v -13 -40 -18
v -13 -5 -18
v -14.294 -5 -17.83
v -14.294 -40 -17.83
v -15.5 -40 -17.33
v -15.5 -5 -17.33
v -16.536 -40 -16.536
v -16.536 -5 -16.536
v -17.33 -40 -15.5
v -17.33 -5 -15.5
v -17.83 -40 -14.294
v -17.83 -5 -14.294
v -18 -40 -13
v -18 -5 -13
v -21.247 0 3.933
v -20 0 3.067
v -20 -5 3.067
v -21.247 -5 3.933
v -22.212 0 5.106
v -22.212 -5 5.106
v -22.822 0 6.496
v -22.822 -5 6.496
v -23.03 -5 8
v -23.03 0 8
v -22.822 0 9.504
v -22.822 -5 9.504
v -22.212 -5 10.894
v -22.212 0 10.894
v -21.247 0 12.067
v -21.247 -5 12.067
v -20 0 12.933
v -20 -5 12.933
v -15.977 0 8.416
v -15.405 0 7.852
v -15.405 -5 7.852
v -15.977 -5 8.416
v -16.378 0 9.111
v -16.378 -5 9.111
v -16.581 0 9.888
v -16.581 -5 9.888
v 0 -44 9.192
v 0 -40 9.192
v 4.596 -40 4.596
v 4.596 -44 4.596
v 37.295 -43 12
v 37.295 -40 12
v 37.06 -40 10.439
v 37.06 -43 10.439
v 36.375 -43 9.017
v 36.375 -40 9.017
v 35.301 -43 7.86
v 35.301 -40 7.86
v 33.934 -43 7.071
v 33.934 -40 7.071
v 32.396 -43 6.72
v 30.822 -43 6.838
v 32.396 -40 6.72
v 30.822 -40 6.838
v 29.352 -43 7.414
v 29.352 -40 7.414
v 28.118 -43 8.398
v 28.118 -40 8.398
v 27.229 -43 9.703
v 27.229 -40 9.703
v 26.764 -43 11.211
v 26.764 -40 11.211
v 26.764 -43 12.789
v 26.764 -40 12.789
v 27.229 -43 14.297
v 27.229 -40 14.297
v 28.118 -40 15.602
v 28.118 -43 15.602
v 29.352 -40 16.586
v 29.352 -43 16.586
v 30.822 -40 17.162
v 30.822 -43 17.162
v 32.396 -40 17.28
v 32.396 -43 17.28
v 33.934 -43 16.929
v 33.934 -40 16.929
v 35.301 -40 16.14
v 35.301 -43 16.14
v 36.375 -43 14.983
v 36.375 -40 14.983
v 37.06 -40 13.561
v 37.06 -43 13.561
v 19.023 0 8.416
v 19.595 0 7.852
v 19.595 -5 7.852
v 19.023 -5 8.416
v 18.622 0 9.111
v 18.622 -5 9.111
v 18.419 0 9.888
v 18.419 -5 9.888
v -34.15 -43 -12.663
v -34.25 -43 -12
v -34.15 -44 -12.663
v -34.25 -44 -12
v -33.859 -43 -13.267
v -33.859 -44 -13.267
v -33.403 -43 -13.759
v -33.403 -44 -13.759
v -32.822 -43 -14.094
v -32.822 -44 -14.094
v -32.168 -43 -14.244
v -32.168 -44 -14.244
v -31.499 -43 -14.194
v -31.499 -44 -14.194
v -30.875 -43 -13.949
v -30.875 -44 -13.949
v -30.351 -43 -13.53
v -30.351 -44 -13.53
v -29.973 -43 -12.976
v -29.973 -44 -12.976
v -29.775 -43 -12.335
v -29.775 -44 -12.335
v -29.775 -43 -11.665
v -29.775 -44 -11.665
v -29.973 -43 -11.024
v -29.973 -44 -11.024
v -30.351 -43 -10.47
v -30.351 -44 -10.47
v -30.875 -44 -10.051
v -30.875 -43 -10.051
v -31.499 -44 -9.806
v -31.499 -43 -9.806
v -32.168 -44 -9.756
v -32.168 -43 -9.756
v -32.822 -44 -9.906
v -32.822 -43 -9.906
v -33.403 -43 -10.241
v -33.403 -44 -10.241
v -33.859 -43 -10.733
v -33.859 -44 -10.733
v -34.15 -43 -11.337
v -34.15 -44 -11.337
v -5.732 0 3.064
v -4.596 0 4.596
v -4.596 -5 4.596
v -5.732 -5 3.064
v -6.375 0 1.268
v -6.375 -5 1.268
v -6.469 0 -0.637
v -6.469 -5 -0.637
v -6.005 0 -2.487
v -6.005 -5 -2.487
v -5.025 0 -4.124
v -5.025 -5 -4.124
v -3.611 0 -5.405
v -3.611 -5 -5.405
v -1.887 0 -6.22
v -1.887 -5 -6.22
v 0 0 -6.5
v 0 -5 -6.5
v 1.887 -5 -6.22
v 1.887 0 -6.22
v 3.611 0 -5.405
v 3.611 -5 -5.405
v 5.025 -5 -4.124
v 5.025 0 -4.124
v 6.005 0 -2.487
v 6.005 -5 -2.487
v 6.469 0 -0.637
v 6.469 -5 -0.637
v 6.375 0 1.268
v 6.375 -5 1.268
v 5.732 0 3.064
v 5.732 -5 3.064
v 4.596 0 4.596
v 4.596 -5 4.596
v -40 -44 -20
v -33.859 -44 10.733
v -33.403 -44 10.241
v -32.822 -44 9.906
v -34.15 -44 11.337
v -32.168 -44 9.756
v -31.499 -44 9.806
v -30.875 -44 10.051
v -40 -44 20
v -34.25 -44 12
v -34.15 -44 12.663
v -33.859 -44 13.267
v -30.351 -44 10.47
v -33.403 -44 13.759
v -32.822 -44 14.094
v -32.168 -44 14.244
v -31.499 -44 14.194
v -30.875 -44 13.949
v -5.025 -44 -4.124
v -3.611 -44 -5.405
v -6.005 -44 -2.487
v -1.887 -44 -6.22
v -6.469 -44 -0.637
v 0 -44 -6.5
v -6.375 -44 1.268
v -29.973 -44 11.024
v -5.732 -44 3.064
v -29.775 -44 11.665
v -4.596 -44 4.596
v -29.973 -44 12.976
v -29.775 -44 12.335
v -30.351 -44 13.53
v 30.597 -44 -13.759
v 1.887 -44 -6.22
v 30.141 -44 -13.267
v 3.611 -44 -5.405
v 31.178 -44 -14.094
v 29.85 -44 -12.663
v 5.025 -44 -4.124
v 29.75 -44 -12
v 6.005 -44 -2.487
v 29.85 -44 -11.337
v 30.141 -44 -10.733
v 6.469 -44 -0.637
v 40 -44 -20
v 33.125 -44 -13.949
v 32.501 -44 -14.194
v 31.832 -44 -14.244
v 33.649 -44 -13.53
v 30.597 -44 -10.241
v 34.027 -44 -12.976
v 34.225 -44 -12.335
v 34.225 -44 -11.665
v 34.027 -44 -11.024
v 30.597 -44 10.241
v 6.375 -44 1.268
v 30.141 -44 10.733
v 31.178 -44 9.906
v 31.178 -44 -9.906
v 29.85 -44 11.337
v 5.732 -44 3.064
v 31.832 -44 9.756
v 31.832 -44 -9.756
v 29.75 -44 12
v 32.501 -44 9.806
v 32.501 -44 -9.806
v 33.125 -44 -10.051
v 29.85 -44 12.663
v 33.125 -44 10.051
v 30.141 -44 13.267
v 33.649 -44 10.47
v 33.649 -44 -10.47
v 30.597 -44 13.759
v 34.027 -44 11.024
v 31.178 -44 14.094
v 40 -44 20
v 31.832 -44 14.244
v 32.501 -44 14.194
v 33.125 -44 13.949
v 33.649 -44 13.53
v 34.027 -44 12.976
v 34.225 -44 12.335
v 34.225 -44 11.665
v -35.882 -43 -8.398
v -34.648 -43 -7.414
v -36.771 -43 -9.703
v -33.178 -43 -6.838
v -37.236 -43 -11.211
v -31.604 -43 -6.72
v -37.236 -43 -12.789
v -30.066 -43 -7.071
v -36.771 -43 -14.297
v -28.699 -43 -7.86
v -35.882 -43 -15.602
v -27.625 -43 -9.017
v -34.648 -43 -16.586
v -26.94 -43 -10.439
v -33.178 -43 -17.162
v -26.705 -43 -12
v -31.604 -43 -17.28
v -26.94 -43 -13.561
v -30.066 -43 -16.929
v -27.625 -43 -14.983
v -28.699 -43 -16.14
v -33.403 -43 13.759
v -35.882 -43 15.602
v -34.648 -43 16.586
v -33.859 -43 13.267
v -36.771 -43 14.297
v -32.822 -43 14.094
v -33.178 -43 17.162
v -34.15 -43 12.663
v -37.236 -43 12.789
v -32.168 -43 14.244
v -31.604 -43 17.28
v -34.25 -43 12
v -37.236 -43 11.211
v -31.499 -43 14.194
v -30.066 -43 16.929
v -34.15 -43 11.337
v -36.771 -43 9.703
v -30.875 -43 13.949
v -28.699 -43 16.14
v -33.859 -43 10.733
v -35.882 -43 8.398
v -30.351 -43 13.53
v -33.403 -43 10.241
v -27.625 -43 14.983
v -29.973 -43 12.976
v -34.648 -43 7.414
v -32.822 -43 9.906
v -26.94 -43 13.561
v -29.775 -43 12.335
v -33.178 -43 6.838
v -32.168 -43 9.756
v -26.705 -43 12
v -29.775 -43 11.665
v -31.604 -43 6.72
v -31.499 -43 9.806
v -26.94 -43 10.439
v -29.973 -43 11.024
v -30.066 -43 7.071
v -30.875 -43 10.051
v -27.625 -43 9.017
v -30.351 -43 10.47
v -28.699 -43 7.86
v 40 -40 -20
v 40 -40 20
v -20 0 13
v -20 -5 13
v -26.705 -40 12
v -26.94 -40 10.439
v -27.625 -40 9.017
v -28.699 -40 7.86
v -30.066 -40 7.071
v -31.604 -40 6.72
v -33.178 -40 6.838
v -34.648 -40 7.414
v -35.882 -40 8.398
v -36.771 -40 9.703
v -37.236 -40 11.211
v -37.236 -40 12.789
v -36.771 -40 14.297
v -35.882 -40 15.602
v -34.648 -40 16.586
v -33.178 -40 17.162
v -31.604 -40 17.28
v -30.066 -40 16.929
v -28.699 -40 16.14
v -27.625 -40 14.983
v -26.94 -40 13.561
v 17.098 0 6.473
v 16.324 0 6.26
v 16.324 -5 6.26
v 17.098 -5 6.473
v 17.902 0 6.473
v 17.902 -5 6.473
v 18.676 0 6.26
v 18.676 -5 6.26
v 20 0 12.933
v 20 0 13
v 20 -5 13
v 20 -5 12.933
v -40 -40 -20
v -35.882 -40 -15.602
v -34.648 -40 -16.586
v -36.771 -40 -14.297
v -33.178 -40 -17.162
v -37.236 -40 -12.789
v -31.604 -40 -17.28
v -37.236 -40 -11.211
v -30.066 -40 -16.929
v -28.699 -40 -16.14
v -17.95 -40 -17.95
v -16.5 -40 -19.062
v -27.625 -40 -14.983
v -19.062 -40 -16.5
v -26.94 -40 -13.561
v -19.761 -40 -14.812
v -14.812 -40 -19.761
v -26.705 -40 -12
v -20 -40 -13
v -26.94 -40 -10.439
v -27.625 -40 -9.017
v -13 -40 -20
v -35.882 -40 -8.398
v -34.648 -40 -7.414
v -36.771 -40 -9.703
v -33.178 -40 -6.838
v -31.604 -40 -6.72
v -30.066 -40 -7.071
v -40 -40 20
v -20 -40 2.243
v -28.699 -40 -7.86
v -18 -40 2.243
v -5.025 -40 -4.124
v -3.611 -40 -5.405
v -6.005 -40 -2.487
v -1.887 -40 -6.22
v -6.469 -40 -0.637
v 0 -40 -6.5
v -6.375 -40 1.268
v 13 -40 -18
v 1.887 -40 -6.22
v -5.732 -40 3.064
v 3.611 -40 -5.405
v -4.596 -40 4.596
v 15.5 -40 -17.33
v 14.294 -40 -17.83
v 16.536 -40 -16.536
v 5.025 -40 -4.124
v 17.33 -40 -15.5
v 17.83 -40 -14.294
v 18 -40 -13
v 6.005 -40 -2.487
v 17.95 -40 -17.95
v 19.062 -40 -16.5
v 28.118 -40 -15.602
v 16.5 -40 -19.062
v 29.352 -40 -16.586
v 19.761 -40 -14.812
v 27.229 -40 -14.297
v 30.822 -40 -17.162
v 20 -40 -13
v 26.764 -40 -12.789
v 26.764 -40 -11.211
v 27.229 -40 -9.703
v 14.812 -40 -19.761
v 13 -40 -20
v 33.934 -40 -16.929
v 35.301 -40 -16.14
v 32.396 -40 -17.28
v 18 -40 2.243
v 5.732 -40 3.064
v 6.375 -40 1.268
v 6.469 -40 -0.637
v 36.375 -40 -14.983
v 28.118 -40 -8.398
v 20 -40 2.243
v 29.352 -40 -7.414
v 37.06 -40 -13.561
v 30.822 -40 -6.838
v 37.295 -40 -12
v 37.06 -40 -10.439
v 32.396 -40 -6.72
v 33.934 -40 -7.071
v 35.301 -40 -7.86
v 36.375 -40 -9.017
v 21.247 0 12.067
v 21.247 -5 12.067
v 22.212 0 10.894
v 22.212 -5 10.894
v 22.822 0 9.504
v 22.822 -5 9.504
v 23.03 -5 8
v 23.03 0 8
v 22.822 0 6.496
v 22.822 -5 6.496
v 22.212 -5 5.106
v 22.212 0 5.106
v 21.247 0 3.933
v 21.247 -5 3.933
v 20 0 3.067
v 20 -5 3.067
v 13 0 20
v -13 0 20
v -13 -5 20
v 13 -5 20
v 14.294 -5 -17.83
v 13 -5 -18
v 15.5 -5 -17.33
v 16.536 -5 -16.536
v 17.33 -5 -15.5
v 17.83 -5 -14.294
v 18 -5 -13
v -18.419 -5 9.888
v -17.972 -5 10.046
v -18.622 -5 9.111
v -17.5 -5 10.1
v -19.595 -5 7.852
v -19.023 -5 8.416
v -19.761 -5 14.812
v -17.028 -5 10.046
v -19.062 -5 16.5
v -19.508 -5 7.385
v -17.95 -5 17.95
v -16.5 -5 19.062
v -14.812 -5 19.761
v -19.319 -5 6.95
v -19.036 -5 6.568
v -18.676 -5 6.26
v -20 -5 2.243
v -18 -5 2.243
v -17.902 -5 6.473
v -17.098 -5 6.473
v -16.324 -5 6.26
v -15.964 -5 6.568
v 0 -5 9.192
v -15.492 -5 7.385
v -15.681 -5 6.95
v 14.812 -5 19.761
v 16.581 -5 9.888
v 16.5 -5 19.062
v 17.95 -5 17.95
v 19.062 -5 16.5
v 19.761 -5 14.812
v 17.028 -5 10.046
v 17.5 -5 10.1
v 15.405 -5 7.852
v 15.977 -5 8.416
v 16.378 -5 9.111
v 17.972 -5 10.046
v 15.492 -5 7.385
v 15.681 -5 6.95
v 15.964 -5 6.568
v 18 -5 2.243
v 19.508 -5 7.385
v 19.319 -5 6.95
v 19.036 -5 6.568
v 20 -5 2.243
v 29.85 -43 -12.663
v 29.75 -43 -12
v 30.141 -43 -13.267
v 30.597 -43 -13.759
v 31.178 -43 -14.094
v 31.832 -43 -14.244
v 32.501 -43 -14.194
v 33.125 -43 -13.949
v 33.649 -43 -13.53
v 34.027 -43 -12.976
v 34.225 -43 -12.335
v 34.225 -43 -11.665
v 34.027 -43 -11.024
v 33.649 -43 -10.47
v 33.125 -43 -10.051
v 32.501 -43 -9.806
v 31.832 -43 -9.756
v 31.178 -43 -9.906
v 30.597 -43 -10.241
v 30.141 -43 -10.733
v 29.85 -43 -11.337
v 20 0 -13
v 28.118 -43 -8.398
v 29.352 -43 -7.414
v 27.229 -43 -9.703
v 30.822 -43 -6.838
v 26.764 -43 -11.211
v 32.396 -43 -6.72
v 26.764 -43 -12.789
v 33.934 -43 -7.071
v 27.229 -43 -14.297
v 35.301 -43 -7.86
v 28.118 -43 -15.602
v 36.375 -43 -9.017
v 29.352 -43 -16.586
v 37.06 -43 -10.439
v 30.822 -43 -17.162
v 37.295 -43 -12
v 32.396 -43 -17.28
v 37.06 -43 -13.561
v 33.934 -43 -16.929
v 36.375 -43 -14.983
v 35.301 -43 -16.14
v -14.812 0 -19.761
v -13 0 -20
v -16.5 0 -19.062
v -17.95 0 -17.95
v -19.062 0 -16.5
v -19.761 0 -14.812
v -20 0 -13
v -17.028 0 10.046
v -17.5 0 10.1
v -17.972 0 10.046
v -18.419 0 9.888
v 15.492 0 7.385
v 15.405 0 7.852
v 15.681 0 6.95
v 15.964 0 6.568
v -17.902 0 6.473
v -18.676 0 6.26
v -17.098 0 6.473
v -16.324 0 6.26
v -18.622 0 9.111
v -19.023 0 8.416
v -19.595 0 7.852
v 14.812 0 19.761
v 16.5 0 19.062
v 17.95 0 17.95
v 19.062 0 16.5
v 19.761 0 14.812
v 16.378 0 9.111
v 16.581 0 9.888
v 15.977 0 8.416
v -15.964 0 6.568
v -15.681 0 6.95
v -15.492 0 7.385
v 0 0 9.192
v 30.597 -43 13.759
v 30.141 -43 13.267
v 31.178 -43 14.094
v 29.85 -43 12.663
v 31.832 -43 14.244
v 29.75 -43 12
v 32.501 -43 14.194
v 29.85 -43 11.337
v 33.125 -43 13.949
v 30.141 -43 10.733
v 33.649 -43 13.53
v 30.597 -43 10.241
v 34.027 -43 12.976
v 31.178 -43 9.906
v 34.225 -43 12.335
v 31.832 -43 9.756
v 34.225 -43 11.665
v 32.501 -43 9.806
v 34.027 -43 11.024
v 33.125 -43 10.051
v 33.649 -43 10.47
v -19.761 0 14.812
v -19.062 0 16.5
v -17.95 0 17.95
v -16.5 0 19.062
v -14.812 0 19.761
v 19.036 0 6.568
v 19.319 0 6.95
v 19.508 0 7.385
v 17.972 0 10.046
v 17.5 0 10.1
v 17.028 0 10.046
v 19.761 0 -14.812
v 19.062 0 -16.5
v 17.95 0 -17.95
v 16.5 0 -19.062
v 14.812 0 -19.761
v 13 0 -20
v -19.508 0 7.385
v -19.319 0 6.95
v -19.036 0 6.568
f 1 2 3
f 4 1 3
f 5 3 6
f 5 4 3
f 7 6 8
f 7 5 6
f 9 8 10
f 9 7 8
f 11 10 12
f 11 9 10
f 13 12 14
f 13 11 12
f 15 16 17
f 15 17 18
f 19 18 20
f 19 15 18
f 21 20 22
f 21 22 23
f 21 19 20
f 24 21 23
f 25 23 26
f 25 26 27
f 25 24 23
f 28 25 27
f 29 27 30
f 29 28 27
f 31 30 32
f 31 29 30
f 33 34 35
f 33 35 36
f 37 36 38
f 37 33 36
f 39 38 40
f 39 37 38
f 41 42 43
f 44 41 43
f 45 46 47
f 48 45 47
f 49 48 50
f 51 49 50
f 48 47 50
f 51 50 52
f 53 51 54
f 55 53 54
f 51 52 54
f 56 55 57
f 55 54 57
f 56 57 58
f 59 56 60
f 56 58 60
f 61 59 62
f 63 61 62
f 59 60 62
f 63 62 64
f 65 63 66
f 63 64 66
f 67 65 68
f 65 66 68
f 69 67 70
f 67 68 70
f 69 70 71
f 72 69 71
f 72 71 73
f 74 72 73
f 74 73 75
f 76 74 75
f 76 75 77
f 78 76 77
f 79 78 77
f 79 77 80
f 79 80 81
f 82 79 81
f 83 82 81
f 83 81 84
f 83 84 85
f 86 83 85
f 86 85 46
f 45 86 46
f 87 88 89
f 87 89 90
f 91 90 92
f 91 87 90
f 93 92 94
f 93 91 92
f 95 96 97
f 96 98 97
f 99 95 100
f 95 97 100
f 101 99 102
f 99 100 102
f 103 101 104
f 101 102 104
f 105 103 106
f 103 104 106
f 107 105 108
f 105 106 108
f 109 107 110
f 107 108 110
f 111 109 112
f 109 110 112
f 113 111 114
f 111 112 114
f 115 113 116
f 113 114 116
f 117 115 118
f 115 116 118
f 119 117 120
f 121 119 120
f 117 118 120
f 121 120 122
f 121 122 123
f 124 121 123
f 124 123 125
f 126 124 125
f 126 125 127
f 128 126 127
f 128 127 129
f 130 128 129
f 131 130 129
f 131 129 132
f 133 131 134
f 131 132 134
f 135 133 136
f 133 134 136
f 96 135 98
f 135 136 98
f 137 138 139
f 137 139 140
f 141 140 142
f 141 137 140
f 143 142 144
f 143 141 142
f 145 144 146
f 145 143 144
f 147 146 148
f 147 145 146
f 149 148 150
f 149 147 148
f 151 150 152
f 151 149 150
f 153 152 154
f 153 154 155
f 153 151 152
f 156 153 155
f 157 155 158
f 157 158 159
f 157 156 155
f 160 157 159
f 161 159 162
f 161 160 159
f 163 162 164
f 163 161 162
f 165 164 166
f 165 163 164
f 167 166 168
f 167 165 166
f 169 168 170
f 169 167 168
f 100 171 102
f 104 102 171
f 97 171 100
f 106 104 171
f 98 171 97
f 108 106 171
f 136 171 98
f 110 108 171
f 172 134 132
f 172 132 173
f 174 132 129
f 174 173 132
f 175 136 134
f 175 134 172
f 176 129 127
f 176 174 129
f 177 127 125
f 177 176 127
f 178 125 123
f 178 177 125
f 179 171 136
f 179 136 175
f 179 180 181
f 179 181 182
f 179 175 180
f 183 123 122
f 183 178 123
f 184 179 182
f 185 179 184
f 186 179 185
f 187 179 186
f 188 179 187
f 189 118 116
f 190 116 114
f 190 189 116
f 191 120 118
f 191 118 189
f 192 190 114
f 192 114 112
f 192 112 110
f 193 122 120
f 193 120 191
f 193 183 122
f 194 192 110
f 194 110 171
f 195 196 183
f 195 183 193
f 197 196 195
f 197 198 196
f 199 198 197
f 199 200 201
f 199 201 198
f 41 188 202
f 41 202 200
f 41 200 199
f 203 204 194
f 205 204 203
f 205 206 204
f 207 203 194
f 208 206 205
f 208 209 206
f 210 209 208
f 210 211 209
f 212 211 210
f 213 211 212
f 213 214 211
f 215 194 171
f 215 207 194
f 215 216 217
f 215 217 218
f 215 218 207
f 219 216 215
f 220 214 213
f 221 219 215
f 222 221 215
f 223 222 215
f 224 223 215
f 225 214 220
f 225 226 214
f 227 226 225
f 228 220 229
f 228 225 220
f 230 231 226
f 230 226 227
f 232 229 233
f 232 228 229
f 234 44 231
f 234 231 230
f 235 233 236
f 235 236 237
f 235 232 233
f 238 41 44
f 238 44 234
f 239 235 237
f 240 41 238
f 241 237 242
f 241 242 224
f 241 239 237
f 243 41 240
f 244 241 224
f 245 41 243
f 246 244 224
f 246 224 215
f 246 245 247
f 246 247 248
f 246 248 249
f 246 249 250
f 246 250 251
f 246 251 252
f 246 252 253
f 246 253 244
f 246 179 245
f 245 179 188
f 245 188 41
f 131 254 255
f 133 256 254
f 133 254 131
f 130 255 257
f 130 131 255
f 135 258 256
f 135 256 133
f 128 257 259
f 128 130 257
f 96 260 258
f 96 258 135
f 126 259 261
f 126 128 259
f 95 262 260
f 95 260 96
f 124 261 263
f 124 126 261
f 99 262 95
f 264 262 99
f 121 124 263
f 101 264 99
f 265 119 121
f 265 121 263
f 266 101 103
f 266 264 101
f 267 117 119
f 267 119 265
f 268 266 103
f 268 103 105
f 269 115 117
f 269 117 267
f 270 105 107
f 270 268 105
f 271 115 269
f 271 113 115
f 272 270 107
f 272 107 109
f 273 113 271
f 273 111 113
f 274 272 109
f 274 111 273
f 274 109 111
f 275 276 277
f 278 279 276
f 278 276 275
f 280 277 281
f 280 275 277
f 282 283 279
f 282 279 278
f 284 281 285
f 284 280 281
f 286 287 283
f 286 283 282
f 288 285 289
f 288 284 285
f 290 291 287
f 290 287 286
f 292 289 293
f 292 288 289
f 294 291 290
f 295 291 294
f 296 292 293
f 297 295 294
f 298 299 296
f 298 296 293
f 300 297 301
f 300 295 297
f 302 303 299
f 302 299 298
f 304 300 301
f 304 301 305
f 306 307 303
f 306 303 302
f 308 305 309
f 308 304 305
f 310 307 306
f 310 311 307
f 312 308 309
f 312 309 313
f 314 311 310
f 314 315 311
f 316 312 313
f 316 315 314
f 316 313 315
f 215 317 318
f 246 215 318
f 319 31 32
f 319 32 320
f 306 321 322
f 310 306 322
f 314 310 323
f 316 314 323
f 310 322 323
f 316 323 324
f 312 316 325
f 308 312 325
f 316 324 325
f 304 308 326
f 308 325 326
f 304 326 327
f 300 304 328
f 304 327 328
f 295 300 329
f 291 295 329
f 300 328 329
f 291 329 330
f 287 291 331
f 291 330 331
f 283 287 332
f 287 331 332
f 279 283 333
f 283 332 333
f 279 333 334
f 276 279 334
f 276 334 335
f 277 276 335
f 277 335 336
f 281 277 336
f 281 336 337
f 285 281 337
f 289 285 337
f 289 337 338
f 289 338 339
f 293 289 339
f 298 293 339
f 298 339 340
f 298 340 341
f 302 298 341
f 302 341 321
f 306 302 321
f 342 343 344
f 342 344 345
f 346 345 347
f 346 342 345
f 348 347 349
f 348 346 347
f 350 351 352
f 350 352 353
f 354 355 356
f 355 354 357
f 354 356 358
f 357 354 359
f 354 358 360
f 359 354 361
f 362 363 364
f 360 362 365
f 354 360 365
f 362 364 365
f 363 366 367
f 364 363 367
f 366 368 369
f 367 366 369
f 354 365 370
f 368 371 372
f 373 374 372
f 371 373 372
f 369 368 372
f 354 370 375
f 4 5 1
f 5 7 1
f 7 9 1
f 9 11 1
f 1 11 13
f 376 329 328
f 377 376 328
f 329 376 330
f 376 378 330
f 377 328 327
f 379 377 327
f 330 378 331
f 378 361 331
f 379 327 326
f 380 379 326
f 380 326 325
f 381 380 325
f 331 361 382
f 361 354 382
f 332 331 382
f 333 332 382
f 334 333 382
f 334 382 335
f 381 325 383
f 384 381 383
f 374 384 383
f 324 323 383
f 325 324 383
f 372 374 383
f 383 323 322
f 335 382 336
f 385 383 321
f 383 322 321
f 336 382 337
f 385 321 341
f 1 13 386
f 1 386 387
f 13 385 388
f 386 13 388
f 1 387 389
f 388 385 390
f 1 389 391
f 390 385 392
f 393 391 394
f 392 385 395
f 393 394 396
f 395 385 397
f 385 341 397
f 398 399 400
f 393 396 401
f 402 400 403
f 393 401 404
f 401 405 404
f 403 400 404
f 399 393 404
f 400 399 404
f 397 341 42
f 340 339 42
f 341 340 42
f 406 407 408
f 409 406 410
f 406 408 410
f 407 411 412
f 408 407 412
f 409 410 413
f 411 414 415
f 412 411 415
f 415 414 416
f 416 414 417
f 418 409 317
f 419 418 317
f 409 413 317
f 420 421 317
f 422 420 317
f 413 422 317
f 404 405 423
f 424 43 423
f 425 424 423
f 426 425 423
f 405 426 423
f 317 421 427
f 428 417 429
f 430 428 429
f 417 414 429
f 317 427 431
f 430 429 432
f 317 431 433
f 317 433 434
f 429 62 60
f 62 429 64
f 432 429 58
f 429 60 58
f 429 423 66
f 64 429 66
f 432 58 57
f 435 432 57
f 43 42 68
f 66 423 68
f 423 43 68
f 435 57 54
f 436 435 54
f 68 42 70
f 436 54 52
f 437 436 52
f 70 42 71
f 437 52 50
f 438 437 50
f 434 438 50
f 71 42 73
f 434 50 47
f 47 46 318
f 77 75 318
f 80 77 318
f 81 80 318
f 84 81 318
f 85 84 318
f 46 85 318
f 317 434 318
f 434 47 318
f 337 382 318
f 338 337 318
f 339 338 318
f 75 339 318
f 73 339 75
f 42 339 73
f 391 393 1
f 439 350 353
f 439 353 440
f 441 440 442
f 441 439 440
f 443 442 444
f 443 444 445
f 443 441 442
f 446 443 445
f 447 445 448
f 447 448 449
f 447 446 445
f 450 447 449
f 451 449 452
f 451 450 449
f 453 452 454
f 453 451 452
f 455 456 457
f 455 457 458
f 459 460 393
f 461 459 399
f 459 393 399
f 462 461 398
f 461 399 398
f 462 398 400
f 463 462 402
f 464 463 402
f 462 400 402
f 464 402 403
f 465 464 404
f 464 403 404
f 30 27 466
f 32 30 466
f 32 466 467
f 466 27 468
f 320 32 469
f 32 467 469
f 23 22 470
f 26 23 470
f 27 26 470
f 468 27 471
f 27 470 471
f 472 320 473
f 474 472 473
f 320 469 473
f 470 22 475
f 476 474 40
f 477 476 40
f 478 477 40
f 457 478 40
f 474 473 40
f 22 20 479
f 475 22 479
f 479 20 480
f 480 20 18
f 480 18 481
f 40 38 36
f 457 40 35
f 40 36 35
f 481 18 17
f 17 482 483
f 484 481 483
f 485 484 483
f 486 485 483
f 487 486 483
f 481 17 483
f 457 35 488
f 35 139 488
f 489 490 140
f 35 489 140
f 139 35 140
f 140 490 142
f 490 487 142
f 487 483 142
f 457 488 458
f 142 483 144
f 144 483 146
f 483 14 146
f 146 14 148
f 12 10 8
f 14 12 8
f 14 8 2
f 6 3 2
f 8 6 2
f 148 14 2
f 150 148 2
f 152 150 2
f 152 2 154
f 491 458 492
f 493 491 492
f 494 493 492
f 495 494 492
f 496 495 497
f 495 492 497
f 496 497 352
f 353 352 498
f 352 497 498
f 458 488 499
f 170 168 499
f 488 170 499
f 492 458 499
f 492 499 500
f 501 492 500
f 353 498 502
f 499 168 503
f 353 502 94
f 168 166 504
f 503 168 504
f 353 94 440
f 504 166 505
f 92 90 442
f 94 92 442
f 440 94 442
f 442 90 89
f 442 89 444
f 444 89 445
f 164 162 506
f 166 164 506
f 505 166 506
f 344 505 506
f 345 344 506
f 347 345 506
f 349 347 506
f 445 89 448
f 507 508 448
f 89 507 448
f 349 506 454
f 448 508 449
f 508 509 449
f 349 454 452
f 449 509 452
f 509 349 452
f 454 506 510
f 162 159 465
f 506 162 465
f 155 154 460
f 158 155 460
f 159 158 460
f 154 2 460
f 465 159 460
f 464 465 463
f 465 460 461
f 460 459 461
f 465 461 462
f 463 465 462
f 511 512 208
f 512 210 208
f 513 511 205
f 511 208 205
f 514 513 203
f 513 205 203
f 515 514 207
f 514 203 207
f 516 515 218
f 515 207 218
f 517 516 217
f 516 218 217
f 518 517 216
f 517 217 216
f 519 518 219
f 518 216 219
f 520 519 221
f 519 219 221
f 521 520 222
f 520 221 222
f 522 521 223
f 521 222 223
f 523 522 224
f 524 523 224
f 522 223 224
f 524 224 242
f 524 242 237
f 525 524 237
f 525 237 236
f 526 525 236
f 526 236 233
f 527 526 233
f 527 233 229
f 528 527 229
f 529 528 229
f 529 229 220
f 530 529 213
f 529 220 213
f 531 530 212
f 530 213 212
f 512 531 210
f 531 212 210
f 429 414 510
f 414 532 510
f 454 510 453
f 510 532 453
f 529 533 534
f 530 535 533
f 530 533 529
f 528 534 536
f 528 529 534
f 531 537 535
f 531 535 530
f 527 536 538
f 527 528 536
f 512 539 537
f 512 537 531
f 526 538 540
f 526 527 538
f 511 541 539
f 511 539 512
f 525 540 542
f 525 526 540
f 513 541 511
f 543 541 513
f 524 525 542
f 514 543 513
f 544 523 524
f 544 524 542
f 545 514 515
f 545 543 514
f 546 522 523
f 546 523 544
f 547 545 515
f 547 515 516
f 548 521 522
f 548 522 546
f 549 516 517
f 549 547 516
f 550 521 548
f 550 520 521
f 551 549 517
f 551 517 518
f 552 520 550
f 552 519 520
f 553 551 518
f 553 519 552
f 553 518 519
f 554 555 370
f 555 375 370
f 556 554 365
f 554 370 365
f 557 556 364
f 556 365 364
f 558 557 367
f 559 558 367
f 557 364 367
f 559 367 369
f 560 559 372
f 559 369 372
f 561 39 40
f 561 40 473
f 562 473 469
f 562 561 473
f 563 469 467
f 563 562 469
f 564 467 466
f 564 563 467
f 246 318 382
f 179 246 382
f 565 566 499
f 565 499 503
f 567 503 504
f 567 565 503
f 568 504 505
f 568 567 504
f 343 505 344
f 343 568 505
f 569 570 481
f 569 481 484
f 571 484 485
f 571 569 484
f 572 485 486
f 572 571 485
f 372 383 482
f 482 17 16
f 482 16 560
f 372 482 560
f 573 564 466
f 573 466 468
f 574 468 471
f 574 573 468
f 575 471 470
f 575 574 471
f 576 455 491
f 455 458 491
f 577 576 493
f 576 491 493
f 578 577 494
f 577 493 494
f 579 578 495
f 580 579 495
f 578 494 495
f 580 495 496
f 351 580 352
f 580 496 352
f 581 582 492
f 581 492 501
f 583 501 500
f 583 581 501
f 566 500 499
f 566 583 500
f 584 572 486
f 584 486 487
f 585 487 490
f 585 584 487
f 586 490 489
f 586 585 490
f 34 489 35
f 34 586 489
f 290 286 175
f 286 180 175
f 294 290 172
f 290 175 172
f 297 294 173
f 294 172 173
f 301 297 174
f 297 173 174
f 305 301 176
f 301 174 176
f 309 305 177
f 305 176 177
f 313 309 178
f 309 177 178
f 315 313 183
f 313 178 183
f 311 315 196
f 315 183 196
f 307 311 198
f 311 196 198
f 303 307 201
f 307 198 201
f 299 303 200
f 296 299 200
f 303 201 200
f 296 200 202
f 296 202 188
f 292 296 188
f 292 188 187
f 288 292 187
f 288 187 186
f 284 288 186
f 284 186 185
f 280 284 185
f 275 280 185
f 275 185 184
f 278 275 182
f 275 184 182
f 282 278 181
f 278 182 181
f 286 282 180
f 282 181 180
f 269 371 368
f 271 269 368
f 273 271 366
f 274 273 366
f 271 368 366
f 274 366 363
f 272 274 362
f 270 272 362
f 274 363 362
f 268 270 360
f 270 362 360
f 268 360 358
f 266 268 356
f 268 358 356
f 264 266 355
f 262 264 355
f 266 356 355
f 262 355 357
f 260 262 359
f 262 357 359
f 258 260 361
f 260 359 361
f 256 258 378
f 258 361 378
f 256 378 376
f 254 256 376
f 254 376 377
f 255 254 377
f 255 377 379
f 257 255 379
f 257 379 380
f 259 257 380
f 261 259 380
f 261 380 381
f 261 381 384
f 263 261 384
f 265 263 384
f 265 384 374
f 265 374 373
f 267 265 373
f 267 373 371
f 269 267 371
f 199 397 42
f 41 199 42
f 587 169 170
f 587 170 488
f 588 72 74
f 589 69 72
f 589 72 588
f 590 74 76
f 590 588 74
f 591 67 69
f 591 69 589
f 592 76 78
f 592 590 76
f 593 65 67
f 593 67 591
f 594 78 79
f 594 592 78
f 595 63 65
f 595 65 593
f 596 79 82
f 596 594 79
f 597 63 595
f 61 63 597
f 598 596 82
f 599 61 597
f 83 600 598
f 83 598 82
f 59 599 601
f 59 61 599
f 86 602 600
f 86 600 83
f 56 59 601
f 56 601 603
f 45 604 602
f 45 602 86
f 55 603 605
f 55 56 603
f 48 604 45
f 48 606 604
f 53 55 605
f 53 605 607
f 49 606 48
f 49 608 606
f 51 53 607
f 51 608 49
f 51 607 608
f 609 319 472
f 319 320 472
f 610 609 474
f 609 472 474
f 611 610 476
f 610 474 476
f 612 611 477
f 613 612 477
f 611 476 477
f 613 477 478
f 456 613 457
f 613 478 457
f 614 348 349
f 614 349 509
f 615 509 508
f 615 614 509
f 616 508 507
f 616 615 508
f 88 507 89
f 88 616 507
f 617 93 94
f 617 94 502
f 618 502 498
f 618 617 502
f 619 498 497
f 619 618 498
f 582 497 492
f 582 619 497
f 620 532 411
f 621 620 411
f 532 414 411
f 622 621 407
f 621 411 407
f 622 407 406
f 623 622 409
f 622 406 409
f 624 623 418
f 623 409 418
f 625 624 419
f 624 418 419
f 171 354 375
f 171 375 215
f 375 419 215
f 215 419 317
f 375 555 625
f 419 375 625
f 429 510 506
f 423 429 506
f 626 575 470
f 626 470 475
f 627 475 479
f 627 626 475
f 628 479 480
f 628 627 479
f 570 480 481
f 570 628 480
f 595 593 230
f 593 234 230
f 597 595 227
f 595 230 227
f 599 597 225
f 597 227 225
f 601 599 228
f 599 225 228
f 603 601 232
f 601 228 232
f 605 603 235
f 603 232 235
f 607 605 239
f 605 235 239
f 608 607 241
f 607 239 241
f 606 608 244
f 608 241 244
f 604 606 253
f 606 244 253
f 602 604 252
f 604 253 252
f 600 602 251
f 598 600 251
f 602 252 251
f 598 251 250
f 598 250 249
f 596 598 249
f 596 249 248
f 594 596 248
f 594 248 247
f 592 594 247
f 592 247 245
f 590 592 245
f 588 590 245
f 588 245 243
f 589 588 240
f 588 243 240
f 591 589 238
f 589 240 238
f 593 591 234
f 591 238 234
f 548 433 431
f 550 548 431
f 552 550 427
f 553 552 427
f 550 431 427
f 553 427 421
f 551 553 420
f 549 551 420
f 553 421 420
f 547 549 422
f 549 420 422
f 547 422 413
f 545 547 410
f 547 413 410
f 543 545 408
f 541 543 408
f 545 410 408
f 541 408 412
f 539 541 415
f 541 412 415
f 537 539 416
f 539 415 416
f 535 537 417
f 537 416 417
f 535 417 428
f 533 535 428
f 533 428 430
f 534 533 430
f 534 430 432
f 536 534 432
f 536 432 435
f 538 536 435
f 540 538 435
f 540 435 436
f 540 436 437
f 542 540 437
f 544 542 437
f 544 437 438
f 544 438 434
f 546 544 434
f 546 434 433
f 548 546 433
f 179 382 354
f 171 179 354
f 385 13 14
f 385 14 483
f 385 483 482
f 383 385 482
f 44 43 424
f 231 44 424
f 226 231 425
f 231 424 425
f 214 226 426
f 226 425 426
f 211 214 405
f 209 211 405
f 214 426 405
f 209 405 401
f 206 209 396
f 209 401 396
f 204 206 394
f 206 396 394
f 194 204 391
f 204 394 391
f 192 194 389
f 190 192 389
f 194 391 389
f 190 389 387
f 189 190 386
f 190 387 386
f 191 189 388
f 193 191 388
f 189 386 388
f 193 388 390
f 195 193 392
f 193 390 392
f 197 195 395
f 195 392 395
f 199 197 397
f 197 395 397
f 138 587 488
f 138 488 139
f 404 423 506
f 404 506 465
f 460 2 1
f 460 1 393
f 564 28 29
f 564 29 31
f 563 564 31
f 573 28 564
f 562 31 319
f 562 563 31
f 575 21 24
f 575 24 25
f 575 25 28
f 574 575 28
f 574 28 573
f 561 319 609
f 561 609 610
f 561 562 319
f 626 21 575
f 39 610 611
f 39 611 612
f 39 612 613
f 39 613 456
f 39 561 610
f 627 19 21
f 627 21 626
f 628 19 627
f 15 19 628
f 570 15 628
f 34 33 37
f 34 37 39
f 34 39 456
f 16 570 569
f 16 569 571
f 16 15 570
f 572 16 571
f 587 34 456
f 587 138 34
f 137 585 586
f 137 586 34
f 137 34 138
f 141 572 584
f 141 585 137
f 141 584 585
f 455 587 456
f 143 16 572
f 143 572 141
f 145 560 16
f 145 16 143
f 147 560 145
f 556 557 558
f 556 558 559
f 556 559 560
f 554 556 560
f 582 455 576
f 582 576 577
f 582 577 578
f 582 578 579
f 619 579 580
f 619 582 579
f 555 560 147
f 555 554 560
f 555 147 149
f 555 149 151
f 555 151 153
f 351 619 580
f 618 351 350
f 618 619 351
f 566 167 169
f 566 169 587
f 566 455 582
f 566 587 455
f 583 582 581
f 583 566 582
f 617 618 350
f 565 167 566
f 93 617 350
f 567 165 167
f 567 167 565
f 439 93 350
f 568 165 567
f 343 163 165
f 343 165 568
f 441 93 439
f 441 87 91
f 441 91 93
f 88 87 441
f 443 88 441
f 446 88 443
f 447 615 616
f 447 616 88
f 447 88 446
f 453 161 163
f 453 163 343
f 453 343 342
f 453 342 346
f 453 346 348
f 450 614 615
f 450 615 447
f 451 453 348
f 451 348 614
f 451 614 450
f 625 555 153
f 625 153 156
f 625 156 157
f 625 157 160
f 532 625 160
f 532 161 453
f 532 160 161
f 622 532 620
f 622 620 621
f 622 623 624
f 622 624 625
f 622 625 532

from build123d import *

# Parameters (mm, degrees)
BOSS_EXTRU_1_DEPTH                                 = 5
ESQUISSE7_W                                        = 36
ESQUISSE7_H                                        = 2
BOSS_EXTRU_2_DEPTH                                 = 35
BOSS_EXTRU_4_DEPTH                                 = 4
ESQUISSE1_3_R                                      = 6.5
ENL_V_MAT_EXTRU_2_DEPTH                            = 63.737548565
CHAMBRAGE_POUR_VIS_T_TE_HEXAGONALE_M41_D           = 4.5
CHAMBRAGE_POUR_VIS_T_TE_HEXAGONALE_M41_DEPTH       = 4
CHAMBRAGE_POUR_VIS_T_TE_HEXAGONALE_M41_CBORE_D     = 10.59
CHAMBRAGE_POUR_VIS_T_TE_HEXAGONALE_M41_CBORE_DEPTH = 3
CHAMBRAGE_POUR_VIS_T_TE_HEXAGONALE_M41_TIP         = 1.351936393
CONG_1_R                                           = 5
CONG_2_R                                           = 7


with BuildPart() as part:
    # Esquisse1 → Boss.-Extru.1 (new body)
    with BuildSketch(Plane(origin=(0, 0, 0), x_dir=(1, 0, 0), z_dir=(0, 1, 0))):
        with BuildLine():
            Line((20, 20), (-20, 20))
            Line((-20, 20), (-20, -3.067363788))
            ThreePointArc((-20, -3.067363788), (-23.03, -8), (-20, -12.932636212))
            Line((-20, -12.932636212), (-20, -20))
            Line((-20, -20), (20, -20))
            Line((20, -20), (20, -12.932636212))
            ThreePointArc((20, -12.932636212), (23.03, -8), (20, -3.067363788))
            Line((20, -3.067363788), (20, 20))
        make_face()
        with BuildLine():
            ThreePointArc((-16.580993336, -9.888233765), (-17.5, -10.1), (-18.419006664, -9.888233765))
            ThreePointArc((-18.419006664, -9.888233765), (-18.799038106, -8.75), (-19.594761741, -7.851766235))
            ThreePointArc((-19.594761741, -7.851766235), (-19.318653348, -6.95), (-18.675755077, -6.26))
            ThreePointArc((-18.675755077, -6.26), (-17.5, -6.5), (-16.324244923, -6.26))
            ThreePointArc((-16.324244923, -6.26), (-15.681346652, -6.95), (-15.405238259, -7.851766235))
            ThreePointArc((-15.405238259, -7.851766235), (-16.200961894, -8.75), (-16.580993336, -9.888233765))
        make_face(mode=Mode.SUBTRACT)
        with BuildLine():
            Line((4.596194078, -4.596194078), (0, -9.192388155))
            Line((0, -9.192388155), (-4.596194078, -4.596194078))
            ThreePointArc((-4.596194078, -4.596194078), (0, 6.5), (4.596194078, -4.596194078))
        make_face(mode=Mode.SUBTRACT)
        with BuildLine():
            ThreePointArc((18.419006664, -9.888233765), (17.5, -10.1), (16.580993336, -9.888233765))
            ThreePointArc((16.580993336, -9.888233765), (16.200961894, -8.75), (15.405238259, -7.851766235))
            ThreePointArc((15.405238259, -7.851766235), (15.681346652, -6.95), (16.324244923, -6.26))
            ThreePointArc((16.324244923, -6.26), (17.5, -6.5), (18.675755077, -6.26))
            ThreePointArc((18.675755077, -6.26), (19.318653348, -6.95), (19.594761741, -7.851766235))
            ThreePointArc((19.594761741, -7.851766235), (18.799038106, -8.75), (18.419006664, -9.888233765))
        make_face(mode=Mode.SUBTRACT)
    extrude(amount=-BOSS_EXTRU_1_DEPTH)

    # Esquisse7 → Boss.-Extru.2 (add)
    with BuildSketch(Plane.XZ.offset(5)):
        Polygon((-20, 2.243441463), (-20, -20), (-18, -20), (-18, -18), (-18, 2.243441463), align=None)
        with Locations((0, -19)):
            Rectangle(ESQUISSE7_W, ESQUISSE7_H)
        Polygon((18, -18), (18, -20), (20, -20), (20, 2.243441463), (18, 2.243441463), align=None)
    extrude(amount=BOSS_EXTRU_2_DEPTH)

    # Esquisse9 → Boss.-Extru.4 (add)
    with BuildSketch(Plane.XZ.offset(40)):
        Polygon((-20, 2.243441463), (-20, 20), (-40, 20), (-40, -20), (-20, -20), align=None)
        Polygon((40, 20), (20, 20), (20, 2.243441463), (20, -20), (40, -20), align=None)
        Polygon((0, -18), (0, 20), (-20, 20), (-20, 2.243441463), (-18, 2.243441463), (-18, -18), align=None)
        Polygon((0, -20), (0, -18), (-18, -18), (-18, 2.243441463), (-20, 2.243441463), (-20, -20), align=None)
        Polygon((18, -18), (0, -18), (0, -20), (20, -20), (20, 2.243441463), (18, 2.243441463), align=None)
        Polygon((20, 20), (0, 20), (0, -18), (18, -18), (18, 2.243441463), (20, 2.243441463), align=None)
    extrude(amount=BOSS_EXTRU_4_DEPTH)

    # Esquisse1<3> → Enlèv. mat.-Extru.2 (cut, through all)
    with BuildSketch(Plane(origin=(0, 0, 0), x_dir=(1, 0, 0), z_dir=(0, 1, 0))):
        Circle(ESQUISSE1_3_R)
        with BuildLine():
            Line((0, -9.192388155), (4.596194078, -4.596194078))
            ThreePointArc((4.596194078, -4.596194078), (0, -6.5), (-4.596194078, -4.596194078))
            Line((-4.596194078, -4.596194078), (0, -9.192388155))
        make_face()
    extrude(amount=-ENL_V_MAT_EXTRU_2_DEPTH, mode=Mode.SUBTRACT)

    # Chambrage pour vis à tête hexagonale M41
    with Locations(Plane(origin=(0, -40, 0), x_dir=(1, 0, 0), z_dir=(0, 1, 0))):
        with Locations((-32, -12), (-32, 12), (32, 12), (32, -12)):
            CounterBoreHole(CHAMBRAGE_POUR_VIS_T_TE_HEXAGONALE_M41_D / 2, CHAMBRAGE_POUR_VIS_T_TE_HEXAGONALE_M41_CBORE_D / 2, CHAMBRAGE_POUR_VIS_T_TE_HEXAGONALE_M41_CBORE_DEPTH, depth=CHAMBRAGE_POUR_VIS_T_TE_HEXAGONALE_M41_DEPTH)
            with Locations((0, 0, -(CHAMBRAGE_POUR_VIS_T_TE_HEXAGONALE_M41_DEPTH + CHAMBRAGE_POUR_VIS_T_TE_HEXAGONALE_M41_TIP / 2))):  # 118° drill point
                Cone(0, CHAMBRAGE_POUR_VIS_T_TE_HEXAGONALE_M41_D / 2, CHAMBRAGE_POUR_VIS_T_TE_HEXAGONALE_M41_TIP, mode=Mode.SUBTRACT)

    # Congé1
    cong_1_edges = [part.edges().sort_by_distance(p)[0] for p in [
        (18, -22.5, -18),
        (-18, -22.5, -18),
    ]]
    fillet(cong_1_edges, radius=CONG_1_R)

    # Congé2
    cong_2_edges = [part.edges().sort_by_distance(p)[0] for p in [
        (-20, -20, -20),
        (20, -20, -20),
        (20, -2.5, 20),
        (-20, -2.5, 20),
    ]]
    fillet(cong_2_edges, radius=CONG_2_R)


solid = part.part
